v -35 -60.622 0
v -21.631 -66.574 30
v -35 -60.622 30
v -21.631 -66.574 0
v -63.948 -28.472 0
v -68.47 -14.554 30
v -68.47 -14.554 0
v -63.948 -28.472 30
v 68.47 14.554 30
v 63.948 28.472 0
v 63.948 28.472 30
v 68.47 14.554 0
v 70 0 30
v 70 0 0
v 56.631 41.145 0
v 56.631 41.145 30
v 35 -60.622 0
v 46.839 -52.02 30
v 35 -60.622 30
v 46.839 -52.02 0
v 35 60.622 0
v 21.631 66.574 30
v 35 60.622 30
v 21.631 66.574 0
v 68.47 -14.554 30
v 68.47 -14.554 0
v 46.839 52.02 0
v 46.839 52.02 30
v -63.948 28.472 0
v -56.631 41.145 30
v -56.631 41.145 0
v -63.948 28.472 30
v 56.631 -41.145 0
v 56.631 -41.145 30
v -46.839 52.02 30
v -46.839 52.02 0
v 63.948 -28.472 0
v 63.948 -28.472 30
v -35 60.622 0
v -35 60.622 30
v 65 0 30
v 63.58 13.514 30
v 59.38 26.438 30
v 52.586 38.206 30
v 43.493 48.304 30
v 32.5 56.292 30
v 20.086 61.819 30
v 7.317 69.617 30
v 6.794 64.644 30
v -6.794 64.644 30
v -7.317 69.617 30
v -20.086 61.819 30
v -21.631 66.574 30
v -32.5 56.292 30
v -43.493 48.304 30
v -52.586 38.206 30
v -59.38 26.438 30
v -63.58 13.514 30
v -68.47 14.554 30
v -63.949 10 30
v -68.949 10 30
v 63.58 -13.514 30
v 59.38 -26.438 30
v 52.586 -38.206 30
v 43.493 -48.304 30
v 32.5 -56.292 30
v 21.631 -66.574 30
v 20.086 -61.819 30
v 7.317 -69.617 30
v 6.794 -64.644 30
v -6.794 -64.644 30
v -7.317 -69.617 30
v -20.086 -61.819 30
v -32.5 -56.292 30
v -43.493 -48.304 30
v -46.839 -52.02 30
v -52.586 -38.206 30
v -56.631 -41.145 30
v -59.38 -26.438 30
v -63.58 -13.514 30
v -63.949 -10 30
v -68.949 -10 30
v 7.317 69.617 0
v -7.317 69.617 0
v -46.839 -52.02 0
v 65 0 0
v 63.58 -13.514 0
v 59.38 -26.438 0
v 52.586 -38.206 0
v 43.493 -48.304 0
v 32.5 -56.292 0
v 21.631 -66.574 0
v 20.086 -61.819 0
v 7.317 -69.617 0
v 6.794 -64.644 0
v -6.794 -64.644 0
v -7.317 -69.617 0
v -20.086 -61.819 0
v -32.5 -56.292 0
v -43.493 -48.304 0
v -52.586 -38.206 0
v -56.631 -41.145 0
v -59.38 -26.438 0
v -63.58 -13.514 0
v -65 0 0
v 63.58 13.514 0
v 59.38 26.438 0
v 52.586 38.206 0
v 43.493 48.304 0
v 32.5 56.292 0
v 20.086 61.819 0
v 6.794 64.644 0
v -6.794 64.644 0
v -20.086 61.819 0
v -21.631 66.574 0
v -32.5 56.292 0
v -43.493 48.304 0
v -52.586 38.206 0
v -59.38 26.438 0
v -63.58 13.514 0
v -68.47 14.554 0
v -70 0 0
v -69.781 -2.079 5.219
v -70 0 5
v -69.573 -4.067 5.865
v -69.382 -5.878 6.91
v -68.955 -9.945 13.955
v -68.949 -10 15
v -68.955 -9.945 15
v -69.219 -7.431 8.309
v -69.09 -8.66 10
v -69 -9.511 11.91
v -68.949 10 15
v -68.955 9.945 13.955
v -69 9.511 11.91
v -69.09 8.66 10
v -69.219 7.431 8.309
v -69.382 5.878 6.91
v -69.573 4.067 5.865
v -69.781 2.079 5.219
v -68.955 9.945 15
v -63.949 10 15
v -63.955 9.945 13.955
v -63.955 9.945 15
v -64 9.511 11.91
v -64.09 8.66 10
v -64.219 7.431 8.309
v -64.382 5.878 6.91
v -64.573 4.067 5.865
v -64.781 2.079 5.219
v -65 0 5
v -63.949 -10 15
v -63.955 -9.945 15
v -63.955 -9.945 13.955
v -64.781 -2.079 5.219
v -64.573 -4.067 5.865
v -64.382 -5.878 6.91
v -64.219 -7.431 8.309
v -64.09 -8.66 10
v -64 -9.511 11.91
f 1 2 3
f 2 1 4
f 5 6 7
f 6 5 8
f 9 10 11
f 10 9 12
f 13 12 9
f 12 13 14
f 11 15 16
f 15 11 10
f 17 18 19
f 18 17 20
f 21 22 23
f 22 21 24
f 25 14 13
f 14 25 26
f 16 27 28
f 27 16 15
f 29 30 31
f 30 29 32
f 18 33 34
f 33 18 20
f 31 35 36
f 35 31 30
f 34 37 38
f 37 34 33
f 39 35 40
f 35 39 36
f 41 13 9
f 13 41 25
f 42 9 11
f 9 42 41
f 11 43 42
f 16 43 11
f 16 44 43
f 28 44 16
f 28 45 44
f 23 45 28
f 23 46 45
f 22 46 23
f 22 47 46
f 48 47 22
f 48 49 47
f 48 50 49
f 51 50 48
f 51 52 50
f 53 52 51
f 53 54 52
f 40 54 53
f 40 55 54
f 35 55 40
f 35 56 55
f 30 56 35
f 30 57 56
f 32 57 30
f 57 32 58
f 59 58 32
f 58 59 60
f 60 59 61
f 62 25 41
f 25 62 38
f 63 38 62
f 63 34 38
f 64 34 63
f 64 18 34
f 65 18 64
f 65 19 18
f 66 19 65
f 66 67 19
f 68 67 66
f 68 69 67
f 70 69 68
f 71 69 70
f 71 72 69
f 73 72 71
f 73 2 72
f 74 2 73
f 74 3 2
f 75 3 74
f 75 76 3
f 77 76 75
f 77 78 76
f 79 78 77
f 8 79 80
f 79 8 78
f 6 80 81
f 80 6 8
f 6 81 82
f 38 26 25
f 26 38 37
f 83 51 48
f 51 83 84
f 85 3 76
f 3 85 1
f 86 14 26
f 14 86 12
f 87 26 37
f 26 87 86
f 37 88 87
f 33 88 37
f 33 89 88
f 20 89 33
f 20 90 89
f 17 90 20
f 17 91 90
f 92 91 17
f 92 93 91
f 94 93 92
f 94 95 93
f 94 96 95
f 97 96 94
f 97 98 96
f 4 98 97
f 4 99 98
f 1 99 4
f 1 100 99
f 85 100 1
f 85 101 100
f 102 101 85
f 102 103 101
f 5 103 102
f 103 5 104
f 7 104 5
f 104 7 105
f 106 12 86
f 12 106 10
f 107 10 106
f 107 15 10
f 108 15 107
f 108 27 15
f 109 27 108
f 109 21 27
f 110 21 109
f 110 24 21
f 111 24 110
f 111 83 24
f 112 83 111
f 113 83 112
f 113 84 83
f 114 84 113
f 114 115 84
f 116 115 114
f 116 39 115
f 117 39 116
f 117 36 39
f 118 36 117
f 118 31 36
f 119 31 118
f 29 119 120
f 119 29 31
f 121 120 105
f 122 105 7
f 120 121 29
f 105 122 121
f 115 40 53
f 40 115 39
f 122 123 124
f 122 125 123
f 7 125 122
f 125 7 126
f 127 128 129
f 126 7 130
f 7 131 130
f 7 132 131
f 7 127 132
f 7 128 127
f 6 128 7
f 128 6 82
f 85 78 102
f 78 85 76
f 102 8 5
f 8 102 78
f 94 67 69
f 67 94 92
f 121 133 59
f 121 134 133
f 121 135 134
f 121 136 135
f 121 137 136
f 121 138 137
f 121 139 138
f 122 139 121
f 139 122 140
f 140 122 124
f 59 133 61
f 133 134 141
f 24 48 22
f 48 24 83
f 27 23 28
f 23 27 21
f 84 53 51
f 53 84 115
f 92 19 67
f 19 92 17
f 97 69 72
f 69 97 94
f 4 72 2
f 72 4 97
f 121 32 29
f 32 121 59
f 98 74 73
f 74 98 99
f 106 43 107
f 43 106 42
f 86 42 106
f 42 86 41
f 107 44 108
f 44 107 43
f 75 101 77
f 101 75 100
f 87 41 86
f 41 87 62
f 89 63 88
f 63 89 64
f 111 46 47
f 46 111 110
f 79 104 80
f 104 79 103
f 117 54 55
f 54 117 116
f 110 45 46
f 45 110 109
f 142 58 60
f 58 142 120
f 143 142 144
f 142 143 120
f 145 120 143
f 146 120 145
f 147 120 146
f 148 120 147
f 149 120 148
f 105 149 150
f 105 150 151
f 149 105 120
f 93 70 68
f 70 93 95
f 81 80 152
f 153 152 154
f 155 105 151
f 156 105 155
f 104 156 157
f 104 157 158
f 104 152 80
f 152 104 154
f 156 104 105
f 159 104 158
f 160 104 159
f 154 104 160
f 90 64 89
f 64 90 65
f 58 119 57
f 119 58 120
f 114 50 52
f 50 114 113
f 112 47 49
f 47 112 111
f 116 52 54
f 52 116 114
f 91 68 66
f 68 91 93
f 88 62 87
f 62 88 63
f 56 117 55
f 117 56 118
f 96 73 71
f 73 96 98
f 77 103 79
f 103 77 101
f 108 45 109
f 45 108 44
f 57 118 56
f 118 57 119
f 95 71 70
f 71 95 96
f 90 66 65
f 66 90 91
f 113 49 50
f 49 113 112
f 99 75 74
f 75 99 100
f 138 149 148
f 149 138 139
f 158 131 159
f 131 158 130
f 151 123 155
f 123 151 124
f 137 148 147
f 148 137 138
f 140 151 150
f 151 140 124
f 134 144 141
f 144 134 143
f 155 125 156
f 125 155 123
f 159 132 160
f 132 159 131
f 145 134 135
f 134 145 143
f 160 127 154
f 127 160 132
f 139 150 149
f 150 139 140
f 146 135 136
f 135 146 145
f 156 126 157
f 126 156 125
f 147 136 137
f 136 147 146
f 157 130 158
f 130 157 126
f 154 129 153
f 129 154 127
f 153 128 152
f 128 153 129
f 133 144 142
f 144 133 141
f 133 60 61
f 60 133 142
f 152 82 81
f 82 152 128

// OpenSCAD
// file: lib.scad
module bettersphere(r) {
   sphere(r, $fs=0.5);
}

module bettercylinder(h, r) {
   cylinder(h=h, r=r, $fs=0.5);
}

module roundedcube(dims, rounding, only_sides=false) {
    if (only_sides) {
        translate([rounding, rounding, 0]) {
            minkowski() {
                bettercylinder(1, rounding);
                cube(dims - [2*rounding, 2*rounding, 1]);
            }
        }
    } else {
        translate([rounding, rounding, rounding]) {
            minkowski() {
                cube(dims - [2*rounding, 2*rounding, 2*rounding]);
                bettersphere(rounding);
            }
        }
    }
}

//roundedcube([20, 50, 30], 3, only_sides=false);

module roundedcylinder(h, r, rounding) {
    translate([0, 0, rounding]) {
        minkowski()  {
            cylinder(h = h - 2*rounding, r = r - rounding);
            bettersphere(rounding);
        }
    }
}

//roundedcylinder(50, 20, 5);
// main file
use <lib.scad>

height = 30;
inner_radius = 130 / 2;
wall = 5;
cable_radius = 20 / 2;

difference() {
    bettercylinder(height, inner_radius + wall);
    
    translate([0, 0, -1])
    bettercylinder(height+2, inner_radius);
    
    translate([-inner_radius-wall, 0, height/2])
    rotate([0, 90, 0])
    bettercylinder(wall + 2, cable_radius);
    
    translate([-inner_radius-wall, -cable_radius, height/2])
    cube([wall+2, cable_radius*2, height/2+1]);
}
